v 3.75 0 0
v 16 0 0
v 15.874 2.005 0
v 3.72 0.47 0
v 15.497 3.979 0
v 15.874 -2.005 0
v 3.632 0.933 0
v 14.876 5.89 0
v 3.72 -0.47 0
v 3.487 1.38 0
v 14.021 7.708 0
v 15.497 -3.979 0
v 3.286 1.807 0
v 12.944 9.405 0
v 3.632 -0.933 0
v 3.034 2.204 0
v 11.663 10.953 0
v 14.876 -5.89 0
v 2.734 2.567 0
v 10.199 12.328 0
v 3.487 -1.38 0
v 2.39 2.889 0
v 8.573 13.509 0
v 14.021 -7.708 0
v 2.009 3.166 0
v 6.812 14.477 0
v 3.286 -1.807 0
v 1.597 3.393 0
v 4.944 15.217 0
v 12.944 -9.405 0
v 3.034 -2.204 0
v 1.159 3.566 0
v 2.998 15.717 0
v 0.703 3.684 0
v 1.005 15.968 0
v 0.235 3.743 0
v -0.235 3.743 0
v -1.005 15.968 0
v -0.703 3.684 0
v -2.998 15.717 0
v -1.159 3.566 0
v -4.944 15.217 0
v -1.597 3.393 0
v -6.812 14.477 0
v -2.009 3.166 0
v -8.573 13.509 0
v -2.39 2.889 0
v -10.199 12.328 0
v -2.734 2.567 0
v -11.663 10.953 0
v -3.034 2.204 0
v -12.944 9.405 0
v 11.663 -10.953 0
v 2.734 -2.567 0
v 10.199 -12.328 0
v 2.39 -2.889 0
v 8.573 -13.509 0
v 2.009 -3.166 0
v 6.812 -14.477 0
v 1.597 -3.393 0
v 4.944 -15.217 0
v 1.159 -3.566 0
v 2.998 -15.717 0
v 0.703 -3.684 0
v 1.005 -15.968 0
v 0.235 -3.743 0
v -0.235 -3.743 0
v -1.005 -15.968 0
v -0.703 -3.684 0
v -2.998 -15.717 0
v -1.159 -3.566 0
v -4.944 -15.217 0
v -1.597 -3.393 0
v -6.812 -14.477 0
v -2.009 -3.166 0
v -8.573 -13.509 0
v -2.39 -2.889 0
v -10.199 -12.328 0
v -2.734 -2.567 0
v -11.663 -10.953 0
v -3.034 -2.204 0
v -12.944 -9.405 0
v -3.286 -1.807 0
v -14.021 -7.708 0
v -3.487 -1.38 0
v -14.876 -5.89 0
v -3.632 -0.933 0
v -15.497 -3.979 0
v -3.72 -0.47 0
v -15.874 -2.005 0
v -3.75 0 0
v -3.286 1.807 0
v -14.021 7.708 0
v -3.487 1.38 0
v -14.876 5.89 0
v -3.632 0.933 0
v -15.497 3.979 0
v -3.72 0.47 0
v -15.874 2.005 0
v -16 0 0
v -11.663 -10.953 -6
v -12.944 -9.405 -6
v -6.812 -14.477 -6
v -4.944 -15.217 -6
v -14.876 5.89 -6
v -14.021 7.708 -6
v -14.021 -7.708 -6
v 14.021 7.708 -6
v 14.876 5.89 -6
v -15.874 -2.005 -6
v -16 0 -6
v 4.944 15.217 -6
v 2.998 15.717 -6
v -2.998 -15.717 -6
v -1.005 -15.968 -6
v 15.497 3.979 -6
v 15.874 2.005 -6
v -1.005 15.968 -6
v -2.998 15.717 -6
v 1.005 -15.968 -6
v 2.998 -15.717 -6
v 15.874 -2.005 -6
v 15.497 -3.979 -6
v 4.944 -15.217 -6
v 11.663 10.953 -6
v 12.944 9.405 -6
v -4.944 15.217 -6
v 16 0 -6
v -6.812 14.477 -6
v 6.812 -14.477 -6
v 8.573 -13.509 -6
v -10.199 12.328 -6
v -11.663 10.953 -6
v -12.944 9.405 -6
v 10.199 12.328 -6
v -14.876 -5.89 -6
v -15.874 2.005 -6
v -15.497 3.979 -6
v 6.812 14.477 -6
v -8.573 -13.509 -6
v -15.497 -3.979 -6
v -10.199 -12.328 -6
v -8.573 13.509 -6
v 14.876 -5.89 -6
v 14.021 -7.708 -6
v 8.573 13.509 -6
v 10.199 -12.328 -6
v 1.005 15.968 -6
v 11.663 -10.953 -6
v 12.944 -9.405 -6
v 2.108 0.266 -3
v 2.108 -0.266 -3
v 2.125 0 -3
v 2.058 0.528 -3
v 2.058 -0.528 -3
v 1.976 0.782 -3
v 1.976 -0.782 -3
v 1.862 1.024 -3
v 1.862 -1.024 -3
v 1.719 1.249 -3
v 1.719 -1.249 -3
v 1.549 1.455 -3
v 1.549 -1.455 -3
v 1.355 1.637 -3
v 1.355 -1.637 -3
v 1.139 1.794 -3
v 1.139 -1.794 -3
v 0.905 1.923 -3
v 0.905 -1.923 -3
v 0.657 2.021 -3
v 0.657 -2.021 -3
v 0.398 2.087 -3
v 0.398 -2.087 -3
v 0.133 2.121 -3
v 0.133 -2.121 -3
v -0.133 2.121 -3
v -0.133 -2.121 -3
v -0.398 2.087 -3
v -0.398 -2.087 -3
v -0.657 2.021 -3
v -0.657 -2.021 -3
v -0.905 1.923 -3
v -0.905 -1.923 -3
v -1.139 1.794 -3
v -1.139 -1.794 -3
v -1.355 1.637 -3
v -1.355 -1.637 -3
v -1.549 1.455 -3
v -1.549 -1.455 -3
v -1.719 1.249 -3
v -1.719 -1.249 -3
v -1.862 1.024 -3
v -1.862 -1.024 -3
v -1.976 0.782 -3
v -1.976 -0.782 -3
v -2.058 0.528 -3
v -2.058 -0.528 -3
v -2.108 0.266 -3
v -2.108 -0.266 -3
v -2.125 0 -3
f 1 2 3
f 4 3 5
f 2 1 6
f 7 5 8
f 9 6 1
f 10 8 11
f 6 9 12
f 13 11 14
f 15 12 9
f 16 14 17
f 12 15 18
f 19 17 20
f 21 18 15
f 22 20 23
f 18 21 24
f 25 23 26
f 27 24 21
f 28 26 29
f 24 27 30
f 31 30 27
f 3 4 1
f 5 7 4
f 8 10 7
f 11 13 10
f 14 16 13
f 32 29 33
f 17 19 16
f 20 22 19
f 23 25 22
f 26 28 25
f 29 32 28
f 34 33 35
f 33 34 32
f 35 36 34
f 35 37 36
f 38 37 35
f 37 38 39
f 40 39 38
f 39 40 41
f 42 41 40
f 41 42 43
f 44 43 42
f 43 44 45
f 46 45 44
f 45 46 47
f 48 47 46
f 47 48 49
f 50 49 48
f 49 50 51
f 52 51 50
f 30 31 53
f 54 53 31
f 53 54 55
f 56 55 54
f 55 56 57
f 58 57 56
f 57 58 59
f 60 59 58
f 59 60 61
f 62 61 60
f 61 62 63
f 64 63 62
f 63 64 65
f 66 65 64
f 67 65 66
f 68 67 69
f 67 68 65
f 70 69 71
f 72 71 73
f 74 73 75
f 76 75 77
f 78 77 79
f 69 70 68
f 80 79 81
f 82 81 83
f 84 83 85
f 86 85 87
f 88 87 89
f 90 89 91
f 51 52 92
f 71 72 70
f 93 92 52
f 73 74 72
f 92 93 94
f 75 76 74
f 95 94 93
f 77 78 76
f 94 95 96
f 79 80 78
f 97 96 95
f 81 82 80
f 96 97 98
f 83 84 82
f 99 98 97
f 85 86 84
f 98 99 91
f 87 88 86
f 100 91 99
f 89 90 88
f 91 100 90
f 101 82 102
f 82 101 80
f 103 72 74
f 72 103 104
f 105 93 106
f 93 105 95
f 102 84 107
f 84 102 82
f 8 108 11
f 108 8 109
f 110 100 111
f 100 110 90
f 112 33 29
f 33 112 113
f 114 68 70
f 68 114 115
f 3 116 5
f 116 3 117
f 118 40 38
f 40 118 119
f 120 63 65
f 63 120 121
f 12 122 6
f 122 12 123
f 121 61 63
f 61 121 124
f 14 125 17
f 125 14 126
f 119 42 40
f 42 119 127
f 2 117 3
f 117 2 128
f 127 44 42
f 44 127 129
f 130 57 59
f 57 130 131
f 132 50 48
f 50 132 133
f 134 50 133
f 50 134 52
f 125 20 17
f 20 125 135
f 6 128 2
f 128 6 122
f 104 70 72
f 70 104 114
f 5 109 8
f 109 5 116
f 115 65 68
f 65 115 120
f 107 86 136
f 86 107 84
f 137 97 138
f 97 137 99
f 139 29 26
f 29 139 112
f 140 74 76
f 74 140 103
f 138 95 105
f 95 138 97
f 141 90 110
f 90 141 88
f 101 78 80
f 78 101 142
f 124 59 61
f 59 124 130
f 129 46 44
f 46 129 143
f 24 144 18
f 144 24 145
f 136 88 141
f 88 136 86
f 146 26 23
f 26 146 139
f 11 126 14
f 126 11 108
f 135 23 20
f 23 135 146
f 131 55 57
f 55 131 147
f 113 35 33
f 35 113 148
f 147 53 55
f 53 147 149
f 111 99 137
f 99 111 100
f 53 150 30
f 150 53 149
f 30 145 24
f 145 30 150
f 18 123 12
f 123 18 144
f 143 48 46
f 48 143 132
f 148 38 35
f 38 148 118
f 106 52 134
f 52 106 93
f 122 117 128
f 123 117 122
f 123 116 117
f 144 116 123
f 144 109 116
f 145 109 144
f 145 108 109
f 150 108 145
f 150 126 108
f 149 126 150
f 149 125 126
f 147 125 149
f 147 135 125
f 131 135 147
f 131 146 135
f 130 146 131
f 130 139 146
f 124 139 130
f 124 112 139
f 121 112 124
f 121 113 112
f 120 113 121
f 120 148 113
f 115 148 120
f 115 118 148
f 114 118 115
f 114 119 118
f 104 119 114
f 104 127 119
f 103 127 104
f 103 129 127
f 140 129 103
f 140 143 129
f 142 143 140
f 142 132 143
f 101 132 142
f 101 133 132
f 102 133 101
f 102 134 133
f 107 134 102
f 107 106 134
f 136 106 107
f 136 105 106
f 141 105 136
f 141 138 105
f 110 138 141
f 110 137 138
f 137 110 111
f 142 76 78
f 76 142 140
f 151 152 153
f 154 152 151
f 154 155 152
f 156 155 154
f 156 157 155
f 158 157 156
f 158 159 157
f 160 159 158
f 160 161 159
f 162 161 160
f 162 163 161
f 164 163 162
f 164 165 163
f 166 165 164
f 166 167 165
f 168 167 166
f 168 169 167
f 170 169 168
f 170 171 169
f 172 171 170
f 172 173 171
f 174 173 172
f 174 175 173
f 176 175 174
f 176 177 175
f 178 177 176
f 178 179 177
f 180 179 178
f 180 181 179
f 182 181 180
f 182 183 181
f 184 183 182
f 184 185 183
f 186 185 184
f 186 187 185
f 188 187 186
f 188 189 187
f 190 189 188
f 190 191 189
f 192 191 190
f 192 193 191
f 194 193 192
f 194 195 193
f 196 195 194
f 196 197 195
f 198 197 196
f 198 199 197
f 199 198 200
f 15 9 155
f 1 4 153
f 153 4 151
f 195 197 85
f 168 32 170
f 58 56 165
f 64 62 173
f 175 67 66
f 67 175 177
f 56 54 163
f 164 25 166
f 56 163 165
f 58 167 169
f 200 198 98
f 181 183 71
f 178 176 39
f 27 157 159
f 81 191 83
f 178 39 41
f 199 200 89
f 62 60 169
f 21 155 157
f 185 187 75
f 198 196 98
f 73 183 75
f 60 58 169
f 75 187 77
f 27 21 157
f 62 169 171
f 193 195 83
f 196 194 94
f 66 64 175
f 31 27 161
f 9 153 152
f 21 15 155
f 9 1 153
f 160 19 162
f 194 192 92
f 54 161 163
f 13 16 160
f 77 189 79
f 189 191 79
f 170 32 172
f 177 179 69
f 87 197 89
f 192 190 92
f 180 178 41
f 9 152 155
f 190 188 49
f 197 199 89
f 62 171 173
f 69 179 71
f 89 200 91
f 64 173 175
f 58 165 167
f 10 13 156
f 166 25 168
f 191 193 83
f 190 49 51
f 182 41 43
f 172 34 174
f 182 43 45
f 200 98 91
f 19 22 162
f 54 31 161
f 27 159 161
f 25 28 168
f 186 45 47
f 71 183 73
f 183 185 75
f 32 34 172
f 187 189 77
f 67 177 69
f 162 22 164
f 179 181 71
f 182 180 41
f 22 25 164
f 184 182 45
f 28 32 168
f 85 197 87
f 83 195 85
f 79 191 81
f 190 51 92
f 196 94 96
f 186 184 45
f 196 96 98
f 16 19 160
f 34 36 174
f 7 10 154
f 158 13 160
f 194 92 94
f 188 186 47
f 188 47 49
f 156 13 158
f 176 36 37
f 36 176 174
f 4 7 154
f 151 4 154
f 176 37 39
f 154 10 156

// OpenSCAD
$fn = 50;


difference() {
	union() {
		translate(v = [0, 0, -3.0000000000]) {
			cylinder(h = 3, r = 7.0000000000);
		}
		translate(v = [0, 0, -6.0000000000]) {
			cylinder(h = 6, r = 16.0000000000);
		}
	}
	union() {
		translate(v = [0, 0, 0]) {
			rotate(a = [0, 0, 0]) {
				difference() {
					union() {
						#translate(v = [0, 0, -3.0000000000]) {
							cylinder(h = 3, r = 2.0000000000);
						}
						#translate(v = [0, 0, -3]) {
							cylinder(h = 3, r1 = 2.1250000000, r2 = 3.7500000000);
						}
						#translate(v = [0, 0, -3.0000000000]) {
							cylinder(h = 3, r = 2.1250000000);
						}
						#translate(v = [0, 0, -3.0000000000]) {
							cylinder(h = 3, r = 2.0000000000);
						}
					}
					union();
				}
			}
		}
	}
}
